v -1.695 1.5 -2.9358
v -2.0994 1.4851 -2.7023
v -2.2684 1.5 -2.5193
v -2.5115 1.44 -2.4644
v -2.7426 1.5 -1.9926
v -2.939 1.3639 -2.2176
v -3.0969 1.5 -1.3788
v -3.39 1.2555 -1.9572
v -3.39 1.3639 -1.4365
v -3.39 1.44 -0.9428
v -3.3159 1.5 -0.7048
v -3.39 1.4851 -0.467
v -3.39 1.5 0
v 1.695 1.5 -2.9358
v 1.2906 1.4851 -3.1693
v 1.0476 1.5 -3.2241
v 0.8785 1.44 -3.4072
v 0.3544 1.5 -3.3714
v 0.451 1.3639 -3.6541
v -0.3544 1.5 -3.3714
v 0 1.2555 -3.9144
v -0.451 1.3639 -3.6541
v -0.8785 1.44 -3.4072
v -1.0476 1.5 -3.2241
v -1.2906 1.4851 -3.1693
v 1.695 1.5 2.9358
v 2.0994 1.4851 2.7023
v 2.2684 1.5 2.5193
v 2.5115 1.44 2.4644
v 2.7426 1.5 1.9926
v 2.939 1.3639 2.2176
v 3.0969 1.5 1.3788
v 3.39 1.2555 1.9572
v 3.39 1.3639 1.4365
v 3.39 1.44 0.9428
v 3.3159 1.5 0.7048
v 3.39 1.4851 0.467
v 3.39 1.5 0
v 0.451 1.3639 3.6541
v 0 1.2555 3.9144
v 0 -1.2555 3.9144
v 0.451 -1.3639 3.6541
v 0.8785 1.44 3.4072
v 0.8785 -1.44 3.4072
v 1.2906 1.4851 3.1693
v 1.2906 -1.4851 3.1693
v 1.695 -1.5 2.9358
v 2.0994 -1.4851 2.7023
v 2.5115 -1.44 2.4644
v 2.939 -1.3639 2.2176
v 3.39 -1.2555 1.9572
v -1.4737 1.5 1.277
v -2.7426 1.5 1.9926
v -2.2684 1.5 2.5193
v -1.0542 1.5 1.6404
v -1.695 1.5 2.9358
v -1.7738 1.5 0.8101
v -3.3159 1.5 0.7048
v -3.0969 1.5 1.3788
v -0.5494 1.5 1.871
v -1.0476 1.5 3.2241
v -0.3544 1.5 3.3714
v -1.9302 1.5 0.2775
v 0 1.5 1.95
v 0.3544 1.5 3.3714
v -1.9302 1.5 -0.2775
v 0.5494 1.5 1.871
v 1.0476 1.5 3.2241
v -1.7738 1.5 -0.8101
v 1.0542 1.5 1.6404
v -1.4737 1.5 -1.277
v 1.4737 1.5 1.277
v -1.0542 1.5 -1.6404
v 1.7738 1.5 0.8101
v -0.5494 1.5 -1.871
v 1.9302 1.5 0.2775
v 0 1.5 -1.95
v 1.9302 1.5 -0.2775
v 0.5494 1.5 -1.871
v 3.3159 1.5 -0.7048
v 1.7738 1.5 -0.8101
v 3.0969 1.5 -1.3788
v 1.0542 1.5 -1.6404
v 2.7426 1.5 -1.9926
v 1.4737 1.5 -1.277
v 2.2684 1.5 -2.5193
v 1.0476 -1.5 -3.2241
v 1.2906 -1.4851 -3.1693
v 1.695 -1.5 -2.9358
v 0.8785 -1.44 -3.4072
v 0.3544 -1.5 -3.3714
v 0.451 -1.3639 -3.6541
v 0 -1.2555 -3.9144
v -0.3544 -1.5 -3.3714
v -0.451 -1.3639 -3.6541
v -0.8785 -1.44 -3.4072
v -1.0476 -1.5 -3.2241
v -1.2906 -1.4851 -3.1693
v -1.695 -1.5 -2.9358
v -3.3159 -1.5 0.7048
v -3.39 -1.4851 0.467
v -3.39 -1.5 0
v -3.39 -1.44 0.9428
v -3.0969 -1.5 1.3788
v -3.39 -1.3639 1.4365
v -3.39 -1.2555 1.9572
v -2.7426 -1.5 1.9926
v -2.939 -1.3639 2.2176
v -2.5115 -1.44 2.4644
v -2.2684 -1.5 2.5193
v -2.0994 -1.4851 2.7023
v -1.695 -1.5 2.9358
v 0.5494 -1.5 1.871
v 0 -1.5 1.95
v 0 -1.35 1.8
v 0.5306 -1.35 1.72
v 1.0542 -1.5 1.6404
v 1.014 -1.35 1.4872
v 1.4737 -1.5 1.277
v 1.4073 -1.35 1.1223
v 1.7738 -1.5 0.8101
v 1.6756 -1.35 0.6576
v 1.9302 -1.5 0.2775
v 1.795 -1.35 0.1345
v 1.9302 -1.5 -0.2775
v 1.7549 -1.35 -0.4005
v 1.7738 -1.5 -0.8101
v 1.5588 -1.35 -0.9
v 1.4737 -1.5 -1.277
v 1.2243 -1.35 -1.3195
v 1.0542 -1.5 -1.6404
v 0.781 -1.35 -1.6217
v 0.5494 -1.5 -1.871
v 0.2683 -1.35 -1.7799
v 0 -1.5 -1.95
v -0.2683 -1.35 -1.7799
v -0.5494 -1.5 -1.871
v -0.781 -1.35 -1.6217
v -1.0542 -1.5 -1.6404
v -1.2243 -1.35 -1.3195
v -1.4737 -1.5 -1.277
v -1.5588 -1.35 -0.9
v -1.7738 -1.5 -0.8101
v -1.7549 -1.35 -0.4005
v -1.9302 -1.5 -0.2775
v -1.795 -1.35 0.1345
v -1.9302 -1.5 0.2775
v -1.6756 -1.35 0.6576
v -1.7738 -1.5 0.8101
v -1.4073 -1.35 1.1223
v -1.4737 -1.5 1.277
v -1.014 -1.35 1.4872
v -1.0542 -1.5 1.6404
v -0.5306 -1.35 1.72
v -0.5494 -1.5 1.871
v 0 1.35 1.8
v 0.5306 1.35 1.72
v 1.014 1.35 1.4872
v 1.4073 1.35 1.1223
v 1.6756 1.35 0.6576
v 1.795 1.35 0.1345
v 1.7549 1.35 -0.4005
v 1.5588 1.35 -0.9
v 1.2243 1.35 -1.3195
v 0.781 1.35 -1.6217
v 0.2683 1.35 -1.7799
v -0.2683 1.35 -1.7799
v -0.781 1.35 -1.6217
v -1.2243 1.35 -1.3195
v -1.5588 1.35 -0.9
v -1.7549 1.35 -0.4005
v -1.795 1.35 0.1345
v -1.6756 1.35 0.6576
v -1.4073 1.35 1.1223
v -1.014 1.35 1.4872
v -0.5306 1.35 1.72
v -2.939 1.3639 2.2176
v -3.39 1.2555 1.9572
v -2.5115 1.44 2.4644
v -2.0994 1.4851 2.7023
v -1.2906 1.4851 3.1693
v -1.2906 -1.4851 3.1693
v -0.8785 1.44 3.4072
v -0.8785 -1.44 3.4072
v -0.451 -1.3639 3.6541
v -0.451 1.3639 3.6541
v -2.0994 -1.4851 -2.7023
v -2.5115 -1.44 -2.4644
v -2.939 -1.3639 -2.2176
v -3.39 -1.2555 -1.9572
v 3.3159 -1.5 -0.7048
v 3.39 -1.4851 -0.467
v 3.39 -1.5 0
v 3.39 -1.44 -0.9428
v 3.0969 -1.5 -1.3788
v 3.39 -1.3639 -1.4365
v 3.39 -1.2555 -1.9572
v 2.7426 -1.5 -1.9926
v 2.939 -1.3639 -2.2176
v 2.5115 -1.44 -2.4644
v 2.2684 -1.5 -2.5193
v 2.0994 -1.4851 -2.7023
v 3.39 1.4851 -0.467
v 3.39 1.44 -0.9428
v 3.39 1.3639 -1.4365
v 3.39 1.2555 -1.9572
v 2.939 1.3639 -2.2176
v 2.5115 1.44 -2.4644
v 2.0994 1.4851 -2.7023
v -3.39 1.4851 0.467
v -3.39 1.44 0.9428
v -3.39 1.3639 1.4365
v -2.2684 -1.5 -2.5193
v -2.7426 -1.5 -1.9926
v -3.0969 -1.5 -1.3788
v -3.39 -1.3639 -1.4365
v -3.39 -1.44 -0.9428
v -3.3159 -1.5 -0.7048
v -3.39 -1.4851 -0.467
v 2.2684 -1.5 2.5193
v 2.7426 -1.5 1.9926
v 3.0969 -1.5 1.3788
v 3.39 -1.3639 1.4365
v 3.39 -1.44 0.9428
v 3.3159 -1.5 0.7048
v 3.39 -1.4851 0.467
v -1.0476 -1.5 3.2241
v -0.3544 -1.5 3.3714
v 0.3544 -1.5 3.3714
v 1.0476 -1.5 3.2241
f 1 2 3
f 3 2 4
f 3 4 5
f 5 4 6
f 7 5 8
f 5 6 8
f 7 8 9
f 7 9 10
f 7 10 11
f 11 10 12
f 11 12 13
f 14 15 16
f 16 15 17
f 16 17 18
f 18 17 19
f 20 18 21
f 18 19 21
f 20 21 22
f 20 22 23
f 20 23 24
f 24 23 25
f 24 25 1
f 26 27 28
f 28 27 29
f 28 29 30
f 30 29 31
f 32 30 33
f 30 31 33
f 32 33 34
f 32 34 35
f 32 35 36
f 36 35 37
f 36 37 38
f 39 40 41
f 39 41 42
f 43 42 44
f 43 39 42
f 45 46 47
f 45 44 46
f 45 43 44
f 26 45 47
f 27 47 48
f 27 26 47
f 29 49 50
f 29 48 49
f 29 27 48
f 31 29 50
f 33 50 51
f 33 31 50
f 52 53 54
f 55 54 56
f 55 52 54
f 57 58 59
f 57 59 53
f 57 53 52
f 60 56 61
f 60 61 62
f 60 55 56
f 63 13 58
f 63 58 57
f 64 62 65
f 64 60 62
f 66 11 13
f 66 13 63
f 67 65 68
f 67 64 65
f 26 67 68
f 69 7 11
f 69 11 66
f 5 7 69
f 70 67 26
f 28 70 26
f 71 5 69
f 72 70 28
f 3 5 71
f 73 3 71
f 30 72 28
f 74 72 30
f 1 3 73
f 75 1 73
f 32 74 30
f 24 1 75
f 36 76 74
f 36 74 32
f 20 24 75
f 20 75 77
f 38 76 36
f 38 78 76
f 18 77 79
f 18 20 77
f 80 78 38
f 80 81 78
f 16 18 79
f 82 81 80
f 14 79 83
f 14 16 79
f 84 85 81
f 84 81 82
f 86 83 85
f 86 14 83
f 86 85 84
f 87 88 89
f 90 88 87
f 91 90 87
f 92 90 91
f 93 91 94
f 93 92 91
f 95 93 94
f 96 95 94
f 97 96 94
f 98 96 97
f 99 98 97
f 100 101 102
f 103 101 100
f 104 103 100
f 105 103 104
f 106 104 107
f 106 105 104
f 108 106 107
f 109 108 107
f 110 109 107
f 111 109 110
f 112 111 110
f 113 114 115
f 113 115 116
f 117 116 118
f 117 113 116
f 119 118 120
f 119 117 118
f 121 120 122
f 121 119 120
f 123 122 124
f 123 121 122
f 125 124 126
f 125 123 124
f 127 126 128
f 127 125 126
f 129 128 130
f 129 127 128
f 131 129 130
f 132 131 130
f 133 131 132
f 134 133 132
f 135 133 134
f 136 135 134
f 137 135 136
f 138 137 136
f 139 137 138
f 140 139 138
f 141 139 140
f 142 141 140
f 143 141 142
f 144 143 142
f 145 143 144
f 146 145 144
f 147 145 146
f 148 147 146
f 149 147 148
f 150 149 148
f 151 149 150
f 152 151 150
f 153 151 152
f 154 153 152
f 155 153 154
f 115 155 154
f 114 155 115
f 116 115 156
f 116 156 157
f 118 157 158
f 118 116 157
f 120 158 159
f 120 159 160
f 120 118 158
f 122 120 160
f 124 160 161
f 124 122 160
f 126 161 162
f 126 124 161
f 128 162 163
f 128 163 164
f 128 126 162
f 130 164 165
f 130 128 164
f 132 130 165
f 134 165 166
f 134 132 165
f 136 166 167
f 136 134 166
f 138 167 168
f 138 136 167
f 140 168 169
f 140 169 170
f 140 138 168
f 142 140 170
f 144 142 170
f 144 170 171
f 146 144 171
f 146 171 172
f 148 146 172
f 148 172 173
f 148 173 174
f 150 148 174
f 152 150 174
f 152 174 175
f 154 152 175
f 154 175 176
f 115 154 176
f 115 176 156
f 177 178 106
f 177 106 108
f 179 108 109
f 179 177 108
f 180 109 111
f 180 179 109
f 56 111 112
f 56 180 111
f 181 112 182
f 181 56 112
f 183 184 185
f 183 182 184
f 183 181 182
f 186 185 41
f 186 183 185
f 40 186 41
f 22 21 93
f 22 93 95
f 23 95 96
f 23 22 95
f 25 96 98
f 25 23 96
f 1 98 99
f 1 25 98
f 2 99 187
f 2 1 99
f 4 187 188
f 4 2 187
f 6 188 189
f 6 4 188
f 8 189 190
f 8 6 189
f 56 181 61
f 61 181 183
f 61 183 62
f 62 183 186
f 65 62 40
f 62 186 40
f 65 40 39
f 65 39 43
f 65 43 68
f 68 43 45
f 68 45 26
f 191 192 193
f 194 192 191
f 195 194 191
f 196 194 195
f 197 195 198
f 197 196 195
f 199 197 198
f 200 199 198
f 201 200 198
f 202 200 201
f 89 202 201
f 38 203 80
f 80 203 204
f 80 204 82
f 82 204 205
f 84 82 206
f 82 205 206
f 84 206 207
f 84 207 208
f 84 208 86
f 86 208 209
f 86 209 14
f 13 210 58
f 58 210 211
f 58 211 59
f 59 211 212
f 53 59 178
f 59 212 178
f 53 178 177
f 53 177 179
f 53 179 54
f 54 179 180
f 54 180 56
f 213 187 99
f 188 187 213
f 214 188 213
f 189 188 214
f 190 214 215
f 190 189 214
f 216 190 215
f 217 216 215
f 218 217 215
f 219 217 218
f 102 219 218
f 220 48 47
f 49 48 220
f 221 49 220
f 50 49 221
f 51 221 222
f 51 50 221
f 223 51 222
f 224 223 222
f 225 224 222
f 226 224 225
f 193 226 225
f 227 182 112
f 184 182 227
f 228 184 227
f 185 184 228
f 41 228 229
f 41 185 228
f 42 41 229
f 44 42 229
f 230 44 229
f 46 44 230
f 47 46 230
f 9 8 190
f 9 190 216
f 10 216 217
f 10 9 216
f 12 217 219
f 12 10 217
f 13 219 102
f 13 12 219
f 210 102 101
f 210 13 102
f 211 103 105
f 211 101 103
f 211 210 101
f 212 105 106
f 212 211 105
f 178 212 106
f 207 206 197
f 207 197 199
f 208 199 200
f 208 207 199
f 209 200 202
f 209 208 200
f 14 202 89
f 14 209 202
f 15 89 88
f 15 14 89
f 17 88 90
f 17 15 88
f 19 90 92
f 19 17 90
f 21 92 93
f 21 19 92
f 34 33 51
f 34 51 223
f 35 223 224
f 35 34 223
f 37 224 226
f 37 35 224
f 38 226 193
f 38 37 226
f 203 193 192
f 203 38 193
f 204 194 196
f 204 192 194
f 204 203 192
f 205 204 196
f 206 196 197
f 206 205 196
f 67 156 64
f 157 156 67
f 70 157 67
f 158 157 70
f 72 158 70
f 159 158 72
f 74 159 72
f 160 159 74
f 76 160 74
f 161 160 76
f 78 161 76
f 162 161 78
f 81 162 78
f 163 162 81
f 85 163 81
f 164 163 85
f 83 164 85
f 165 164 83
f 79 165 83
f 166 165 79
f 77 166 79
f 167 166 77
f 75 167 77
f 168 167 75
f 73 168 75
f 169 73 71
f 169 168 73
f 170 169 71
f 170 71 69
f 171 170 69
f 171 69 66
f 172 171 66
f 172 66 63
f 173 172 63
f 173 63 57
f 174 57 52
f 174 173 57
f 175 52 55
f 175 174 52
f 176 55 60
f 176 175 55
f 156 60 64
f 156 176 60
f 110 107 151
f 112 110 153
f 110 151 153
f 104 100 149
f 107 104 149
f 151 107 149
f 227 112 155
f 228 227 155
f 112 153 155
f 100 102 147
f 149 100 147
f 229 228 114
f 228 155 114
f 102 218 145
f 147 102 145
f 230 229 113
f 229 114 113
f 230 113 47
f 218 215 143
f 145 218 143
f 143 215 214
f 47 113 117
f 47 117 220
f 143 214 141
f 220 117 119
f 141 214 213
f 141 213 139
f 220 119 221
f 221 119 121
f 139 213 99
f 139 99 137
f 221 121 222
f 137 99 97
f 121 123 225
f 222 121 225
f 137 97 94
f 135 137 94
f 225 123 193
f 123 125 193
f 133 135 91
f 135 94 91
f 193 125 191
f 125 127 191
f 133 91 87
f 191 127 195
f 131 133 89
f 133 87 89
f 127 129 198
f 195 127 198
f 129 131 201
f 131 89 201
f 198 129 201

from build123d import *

# Parameters (mm, degrees)
SKETCH1_R           = 1.8
BOSS_EXTRUDE1_DEPTH = 1.5
CHAMFER1_SIZE       = 0.15


with BuildPart() as part:
    # Sketch1 → Boss-Extrude1 (new, symmetric)
    with BuildSketch(Plane(origin=(0, 0, 0), x_dir=(1, 0, 0), z_dir=(0, 1, 0))):
        Polygon((0, 3.914434825), (-3.39, 1.957217413), (-3.39, -1.957217413), (0, -3.914434825), (3.39, -1.957217413), (3.39, 1.957217413), align=None)
        with Locations(Location((0, 0, 0), (0, 0, 270))):
            Circle(SKETCH1_R, mode=Mode.SUBTRACT)
    extrude(amount=BOSS_EXTRUDE1_DEPTH, both=True)

    # Chamfer1
    chamfer1_edges = [part.edges().sort_by_distance(p)[0] for p in [
        (0, -1.5, -1.8),
        (0, 1.5, -1.8),
    ]]
    chamfer(chamfer1_edges, length=CHAMFER1_SIZE)

    # Sketch2 → Cut-Revolve1 (revolve, cut)
    with BuildSketch(Plane.XY):
        Polygon((-3.39, 1.5), (-5, 0.74924467), (-5, 1.5), align=None)
    cut_revolve1 = revolve(axis=Axis((0, 0, 0), (0, 1, 0)), mode=Mode.SUBTRACT)

    # Mirror1: Cut-Revolve1 across plane
    add(cut_revolve1.mirror(Plane.ZX), mode=Mode.SUBTRACT)


solid = part.part
